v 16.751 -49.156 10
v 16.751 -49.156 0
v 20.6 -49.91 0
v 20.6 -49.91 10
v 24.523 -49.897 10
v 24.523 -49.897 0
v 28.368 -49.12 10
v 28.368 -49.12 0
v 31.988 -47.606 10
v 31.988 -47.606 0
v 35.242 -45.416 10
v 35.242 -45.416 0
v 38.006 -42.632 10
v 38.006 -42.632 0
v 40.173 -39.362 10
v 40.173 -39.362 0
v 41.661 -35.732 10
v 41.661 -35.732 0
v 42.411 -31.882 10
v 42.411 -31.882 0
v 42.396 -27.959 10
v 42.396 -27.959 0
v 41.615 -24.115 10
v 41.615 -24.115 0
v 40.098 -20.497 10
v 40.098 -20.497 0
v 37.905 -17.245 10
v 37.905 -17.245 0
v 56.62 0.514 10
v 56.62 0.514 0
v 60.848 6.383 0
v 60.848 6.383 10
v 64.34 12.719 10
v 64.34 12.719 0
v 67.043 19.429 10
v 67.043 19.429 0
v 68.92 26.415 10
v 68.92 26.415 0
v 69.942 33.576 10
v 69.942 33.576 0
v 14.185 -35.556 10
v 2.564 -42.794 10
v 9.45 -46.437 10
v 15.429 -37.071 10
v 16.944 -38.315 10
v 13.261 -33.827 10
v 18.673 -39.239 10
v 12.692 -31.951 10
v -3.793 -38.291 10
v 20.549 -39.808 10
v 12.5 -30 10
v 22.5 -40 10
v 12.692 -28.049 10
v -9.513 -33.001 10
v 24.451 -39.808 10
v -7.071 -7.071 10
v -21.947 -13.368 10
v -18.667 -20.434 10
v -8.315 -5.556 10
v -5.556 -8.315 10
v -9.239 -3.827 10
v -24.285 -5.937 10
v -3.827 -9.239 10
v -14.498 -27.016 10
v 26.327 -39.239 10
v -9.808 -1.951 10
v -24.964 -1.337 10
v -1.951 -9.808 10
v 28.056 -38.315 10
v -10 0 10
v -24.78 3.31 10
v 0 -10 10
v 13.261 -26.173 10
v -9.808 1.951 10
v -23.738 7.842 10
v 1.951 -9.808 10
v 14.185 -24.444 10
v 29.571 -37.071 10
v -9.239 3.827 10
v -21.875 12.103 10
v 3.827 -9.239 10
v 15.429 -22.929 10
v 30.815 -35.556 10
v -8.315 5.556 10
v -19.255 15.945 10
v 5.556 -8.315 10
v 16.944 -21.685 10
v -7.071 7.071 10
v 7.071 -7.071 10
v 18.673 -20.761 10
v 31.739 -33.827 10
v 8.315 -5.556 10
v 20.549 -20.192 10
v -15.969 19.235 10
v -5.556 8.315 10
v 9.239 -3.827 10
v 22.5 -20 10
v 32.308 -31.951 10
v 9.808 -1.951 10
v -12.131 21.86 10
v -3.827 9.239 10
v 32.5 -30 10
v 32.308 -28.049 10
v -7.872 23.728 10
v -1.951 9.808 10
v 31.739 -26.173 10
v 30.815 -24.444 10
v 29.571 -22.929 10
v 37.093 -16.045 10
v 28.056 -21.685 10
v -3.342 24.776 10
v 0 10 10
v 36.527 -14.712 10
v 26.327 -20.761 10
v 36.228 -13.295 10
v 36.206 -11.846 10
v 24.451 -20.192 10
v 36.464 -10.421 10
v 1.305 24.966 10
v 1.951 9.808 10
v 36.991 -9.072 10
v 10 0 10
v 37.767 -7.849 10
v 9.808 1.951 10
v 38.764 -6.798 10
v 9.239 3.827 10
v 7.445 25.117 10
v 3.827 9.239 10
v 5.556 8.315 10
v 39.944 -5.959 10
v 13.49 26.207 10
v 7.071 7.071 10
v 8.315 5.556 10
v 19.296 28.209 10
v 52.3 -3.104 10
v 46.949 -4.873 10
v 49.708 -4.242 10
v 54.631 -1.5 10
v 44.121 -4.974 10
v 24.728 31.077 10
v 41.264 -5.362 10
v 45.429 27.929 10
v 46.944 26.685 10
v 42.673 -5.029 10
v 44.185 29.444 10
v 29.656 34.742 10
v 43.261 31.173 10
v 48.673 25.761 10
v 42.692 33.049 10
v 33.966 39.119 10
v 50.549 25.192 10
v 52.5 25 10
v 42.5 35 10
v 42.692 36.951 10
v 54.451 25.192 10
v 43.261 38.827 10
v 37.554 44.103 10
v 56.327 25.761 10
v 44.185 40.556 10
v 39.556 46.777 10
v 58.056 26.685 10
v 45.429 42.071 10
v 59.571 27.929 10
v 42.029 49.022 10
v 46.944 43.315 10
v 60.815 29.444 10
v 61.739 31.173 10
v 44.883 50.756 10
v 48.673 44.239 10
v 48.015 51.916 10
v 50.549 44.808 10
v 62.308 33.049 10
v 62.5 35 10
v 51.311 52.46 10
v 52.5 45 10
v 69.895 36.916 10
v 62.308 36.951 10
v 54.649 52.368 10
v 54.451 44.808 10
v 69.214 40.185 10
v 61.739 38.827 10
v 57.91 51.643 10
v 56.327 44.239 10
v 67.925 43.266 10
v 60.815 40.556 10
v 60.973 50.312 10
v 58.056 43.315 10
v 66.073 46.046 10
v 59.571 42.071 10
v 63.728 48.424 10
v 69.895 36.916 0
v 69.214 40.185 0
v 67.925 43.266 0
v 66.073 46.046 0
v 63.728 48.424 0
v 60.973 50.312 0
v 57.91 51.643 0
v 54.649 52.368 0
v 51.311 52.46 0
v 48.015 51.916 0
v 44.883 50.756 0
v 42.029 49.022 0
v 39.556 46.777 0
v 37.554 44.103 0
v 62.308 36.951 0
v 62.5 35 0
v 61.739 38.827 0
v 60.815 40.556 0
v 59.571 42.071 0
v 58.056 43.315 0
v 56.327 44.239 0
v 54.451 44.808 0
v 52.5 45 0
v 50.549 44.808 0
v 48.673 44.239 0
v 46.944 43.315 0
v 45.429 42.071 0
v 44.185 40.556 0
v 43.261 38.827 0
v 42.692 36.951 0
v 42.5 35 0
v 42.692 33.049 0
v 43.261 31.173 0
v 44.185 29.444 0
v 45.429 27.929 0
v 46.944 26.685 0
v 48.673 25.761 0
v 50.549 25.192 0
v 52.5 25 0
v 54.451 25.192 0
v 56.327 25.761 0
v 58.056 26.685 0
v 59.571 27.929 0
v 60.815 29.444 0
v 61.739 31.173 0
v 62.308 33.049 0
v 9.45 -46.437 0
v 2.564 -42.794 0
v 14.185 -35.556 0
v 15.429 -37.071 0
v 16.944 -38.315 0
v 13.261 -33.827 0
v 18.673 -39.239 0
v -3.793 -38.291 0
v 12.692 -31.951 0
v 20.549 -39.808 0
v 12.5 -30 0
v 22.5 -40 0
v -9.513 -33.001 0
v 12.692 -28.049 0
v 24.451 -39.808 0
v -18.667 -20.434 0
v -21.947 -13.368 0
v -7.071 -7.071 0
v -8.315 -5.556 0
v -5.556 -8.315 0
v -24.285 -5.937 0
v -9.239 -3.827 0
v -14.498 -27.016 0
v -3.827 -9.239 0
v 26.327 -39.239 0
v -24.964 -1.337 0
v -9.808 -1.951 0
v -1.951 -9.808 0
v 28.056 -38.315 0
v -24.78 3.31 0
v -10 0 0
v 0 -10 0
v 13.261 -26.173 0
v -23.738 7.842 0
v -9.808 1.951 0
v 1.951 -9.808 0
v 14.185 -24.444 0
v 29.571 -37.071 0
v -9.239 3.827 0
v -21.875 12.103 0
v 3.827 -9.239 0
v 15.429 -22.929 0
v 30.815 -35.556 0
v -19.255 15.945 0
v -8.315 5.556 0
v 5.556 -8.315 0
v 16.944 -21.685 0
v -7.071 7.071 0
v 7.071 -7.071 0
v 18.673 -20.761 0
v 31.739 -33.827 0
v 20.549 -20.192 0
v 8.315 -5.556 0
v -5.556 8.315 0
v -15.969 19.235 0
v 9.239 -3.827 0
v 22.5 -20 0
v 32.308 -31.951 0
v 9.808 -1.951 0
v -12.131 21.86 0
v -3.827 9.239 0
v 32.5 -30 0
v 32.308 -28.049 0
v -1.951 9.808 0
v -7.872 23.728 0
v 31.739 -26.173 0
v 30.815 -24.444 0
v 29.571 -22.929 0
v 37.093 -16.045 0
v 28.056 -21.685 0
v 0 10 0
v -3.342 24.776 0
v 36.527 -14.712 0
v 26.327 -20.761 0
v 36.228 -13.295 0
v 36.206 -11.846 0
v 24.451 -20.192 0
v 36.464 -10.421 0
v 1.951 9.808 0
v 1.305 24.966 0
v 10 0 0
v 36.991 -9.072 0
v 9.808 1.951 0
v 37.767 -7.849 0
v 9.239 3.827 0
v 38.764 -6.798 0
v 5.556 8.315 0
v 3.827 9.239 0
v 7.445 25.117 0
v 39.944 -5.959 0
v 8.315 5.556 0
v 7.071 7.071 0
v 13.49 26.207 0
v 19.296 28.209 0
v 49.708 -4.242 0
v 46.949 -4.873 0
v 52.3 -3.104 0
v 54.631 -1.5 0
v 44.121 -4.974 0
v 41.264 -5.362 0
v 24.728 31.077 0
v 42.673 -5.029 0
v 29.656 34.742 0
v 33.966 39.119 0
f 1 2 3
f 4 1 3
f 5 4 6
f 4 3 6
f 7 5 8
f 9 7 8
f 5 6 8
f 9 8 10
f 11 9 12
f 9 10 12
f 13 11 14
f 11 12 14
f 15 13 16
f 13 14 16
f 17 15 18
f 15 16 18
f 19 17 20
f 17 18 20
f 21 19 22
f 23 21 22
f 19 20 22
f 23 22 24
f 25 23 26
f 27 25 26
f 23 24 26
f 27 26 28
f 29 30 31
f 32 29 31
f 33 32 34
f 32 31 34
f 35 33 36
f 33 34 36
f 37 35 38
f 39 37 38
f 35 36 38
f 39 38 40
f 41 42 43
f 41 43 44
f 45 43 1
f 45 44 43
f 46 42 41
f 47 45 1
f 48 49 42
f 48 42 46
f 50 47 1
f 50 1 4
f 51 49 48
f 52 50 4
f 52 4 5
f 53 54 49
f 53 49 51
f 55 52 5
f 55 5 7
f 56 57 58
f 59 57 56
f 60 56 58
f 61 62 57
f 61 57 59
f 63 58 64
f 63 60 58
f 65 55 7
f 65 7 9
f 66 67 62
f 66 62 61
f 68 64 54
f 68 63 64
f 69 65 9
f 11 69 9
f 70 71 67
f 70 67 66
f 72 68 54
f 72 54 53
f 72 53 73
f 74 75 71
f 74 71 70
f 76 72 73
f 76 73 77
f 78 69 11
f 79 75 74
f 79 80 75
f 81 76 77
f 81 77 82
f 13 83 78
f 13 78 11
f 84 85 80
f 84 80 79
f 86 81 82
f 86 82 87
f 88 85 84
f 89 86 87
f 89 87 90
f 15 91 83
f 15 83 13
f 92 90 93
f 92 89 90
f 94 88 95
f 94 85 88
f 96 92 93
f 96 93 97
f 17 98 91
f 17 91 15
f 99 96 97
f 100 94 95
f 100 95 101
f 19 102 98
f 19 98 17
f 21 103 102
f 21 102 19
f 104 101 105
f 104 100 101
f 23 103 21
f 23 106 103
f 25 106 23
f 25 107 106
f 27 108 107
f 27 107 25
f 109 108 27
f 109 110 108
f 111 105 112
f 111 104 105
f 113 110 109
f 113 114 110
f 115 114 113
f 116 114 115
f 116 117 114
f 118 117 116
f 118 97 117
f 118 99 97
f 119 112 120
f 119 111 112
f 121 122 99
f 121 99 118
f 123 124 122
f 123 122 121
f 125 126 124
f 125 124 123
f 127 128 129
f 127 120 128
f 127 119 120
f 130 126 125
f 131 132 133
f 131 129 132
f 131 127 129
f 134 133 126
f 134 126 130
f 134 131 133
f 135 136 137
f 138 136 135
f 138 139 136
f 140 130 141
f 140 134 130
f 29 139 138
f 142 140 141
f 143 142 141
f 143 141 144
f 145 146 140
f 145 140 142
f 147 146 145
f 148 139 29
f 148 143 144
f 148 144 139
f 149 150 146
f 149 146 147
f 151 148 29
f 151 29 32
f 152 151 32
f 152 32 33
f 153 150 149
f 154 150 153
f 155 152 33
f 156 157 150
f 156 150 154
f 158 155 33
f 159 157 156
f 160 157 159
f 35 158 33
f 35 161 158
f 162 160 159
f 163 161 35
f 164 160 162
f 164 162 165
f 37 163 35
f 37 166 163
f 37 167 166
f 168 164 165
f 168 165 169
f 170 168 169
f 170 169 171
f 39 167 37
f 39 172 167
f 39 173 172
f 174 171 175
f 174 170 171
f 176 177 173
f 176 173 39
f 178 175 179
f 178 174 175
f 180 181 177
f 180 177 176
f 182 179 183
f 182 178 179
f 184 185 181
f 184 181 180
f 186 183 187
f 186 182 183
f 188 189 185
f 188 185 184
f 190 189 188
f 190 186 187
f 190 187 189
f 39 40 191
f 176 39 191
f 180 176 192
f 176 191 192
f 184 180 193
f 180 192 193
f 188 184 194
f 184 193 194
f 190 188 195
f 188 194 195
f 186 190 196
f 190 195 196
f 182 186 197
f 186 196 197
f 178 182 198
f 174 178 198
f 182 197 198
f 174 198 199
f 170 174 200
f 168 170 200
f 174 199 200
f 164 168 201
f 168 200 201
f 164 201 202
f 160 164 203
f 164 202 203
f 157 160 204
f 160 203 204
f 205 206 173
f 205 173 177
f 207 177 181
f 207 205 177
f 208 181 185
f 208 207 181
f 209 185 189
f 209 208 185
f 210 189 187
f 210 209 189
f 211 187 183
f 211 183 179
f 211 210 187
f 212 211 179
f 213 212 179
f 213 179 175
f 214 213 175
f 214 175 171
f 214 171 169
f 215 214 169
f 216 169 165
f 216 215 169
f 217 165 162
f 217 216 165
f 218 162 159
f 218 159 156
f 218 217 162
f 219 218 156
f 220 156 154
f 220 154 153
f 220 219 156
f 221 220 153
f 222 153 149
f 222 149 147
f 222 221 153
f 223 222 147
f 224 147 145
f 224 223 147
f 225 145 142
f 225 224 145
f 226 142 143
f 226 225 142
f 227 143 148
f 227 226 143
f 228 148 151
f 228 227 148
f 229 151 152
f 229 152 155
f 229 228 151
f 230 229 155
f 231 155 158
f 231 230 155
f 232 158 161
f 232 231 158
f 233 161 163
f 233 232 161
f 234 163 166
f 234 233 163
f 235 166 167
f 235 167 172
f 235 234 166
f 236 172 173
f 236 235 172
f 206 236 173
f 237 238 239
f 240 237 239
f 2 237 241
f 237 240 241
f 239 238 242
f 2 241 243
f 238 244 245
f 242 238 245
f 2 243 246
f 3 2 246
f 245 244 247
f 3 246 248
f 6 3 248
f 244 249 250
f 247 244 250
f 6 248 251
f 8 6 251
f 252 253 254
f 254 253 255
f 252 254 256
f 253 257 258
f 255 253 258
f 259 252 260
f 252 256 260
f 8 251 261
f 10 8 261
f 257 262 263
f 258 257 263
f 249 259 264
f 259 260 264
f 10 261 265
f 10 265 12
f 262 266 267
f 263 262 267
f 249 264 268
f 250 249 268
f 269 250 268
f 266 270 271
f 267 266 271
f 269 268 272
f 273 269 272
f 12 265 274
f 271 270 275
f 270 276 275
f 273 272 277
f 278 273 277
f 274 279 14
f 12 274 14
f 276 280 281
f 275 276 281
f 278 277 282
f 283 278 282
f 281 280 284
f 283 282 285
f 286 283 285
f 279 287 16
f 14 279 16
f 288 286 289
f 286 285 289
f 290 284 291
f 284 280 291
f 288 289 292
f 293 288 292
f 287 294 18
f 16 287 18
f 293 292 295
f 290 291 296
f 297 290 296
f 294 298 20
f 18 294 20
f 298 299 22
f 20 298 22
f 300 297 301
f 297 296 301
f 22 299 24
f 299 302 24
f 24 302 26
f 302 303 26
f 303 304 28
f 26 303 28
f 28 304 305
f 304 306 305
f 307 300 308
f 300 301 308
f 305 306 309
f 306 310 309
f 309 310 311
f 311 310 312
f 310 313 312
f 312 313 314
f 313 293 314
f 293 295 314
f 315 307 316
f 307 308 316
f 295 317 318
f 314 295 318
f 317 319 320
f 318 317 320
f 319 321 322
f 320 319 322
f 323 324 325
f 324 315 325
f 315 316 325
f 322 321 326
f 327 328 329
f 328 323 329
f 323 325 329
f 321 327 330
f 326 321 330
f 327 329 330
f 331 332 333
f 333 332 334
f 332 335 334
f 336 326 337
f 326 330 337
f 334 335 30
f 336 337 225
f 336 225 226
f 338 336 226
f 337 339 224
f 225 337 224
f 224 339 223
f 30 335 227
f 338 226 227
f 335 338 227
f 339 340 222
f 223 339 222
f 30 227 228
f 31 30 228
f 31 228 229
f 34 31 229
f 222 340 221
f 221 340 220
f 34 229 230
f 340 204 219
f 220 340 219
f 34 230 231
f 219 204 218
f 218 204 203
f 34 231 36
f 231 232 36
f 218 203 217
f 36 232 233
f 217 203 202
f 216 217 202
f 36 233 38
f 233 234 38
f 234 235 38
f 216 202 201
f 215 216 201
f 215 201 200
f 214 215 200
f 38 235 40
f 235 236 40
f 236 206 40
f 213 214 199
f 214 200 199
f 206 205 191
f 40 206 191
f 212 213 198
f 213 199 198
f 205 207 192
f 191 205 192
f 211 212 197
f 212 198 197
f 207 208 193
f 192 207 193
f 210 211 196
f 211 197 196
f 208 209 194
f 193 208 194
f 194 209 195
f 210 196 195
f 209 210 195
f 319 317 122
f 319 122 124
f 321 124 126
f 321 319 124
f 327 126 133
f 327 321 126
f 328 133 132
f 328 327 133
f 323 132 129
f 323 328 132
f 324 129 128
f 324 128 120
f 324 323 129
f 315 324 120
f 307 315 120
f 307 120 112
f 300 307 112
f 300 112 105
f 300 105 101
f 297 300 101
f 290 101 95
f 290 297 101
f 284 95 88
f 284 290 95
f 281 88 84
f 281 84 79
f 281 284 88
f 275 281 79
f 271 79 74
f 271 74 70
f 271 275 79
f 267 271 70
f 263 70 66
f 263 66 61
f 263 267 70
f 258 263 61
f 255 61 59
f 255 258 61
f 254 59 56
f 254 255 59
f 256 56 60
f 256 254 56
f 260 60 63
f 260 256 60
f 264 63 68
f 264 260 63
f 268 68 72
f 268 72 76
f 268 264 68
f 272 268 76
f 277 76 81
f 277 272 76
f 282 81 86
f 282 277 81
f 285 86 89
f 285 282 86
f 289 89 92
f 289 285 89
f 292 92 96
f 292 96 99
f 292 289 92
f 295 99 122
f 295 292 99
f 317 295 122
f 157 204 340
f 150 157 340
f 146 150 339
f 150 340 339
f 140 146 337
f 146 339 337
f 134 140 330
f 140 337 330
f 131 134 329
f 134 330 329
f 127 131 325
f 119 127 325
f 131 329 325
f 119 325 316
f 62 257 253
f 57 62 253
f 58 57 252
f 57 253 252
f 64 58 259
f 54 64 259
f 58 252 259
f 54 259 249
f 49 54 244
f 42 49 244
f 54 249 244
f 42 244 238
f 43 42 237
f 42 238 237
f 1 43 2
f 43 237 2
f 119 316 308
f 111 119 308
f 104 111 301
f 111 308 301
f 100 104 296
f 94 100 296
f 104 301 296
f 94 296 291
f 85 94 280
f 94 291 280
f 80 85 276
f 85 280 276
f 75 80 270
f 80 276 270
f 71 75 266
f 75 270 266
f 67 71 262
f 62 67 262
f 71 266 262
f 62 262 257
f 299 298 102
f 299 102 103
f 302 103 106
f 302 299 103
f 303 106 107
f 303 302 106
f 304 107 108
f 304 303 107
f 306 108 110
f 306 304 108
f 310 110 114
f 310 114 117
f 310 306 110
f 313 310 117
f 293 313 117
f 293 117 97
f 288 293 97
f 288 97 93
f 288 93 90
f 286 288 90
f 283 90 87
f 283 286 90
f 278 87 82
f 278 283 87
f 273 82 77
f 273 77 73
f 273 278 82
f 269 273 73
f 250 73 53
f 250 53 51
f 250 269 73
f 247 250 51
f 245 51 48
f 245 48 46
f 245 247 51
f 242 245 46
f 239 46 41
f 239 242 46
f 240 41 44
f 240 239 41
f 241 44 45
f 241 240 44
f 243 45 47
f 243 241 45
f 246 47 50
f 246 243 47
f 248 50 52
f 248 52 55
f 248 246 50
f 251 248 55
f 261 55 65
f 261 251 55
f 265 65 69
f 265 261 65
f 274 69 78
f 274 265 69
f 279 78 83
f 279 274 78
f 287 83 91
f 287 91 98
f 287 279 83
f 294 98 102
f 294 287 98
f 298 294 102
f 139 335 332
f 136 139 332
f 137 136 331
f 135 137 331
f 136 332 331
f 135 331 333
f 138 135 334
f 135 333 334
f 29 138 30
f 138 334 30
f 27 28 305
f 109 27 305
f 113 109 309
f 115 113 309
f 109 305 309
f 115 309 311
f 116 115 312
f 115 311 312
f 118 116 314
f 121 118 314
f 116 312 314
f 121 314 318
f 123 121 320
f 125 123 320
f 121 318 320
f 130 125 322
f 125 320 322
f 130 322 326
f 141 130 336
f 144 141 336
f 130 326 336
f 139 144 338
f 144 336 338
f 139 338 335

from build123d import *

# Parameters (mm, degrees)
F0_R     = 10
F1_DEPTH = 10


with BuildPart() as f1:
    # F0 (on Top) → F1 (new body)
    with BuildSketch(Plane.XY):
        with BuildLine():
            ThreePointArc((37.554206, 44.103474), (22.067235, 29.538399), (1.304766, 24.965929))
            ThreePointArc((1.304766, 24.965929), (-19.255297, 15.944702), (-24.284847, -5.93685))
            ThreePointArc((-24.284847, -5.93685), (-9.512511, -33.001447), (16.750607, -49.155795))
            ThreePointArc((16.750607, -49.155795), (39.169931, -41.050494), (37.904534, -17.244596))
            ThreePointArc((37.904534, -17.244596), (36.990811, -9.071889), (44.120823, -4.974213))
            ThreePointArc((44.120823, -4.974213), (51.030762, -3.734261), (56.619703, 0.514089))
            ThreePointArc((56.619703, 0.514089), (65.792763, 16.032989), (69.941986, 33.576228))
            ThreePointArc((69.941986, 33.576228), (57.909572, 51.642912), (37.554206, 44.103474))
        make_face()
        Circle(F0_R, mode=Mode.SUBTRACT)
        with Locations((22.5, -30)):
            Circle(F0_R, mode=Mode.SUBTRACT)
        with Locations((52.5, 35)):
            Circle(F0_R, mode=Mode.SUBTRACT)
    extrude(amount=F1_DEPTH)


solid = f1.part
